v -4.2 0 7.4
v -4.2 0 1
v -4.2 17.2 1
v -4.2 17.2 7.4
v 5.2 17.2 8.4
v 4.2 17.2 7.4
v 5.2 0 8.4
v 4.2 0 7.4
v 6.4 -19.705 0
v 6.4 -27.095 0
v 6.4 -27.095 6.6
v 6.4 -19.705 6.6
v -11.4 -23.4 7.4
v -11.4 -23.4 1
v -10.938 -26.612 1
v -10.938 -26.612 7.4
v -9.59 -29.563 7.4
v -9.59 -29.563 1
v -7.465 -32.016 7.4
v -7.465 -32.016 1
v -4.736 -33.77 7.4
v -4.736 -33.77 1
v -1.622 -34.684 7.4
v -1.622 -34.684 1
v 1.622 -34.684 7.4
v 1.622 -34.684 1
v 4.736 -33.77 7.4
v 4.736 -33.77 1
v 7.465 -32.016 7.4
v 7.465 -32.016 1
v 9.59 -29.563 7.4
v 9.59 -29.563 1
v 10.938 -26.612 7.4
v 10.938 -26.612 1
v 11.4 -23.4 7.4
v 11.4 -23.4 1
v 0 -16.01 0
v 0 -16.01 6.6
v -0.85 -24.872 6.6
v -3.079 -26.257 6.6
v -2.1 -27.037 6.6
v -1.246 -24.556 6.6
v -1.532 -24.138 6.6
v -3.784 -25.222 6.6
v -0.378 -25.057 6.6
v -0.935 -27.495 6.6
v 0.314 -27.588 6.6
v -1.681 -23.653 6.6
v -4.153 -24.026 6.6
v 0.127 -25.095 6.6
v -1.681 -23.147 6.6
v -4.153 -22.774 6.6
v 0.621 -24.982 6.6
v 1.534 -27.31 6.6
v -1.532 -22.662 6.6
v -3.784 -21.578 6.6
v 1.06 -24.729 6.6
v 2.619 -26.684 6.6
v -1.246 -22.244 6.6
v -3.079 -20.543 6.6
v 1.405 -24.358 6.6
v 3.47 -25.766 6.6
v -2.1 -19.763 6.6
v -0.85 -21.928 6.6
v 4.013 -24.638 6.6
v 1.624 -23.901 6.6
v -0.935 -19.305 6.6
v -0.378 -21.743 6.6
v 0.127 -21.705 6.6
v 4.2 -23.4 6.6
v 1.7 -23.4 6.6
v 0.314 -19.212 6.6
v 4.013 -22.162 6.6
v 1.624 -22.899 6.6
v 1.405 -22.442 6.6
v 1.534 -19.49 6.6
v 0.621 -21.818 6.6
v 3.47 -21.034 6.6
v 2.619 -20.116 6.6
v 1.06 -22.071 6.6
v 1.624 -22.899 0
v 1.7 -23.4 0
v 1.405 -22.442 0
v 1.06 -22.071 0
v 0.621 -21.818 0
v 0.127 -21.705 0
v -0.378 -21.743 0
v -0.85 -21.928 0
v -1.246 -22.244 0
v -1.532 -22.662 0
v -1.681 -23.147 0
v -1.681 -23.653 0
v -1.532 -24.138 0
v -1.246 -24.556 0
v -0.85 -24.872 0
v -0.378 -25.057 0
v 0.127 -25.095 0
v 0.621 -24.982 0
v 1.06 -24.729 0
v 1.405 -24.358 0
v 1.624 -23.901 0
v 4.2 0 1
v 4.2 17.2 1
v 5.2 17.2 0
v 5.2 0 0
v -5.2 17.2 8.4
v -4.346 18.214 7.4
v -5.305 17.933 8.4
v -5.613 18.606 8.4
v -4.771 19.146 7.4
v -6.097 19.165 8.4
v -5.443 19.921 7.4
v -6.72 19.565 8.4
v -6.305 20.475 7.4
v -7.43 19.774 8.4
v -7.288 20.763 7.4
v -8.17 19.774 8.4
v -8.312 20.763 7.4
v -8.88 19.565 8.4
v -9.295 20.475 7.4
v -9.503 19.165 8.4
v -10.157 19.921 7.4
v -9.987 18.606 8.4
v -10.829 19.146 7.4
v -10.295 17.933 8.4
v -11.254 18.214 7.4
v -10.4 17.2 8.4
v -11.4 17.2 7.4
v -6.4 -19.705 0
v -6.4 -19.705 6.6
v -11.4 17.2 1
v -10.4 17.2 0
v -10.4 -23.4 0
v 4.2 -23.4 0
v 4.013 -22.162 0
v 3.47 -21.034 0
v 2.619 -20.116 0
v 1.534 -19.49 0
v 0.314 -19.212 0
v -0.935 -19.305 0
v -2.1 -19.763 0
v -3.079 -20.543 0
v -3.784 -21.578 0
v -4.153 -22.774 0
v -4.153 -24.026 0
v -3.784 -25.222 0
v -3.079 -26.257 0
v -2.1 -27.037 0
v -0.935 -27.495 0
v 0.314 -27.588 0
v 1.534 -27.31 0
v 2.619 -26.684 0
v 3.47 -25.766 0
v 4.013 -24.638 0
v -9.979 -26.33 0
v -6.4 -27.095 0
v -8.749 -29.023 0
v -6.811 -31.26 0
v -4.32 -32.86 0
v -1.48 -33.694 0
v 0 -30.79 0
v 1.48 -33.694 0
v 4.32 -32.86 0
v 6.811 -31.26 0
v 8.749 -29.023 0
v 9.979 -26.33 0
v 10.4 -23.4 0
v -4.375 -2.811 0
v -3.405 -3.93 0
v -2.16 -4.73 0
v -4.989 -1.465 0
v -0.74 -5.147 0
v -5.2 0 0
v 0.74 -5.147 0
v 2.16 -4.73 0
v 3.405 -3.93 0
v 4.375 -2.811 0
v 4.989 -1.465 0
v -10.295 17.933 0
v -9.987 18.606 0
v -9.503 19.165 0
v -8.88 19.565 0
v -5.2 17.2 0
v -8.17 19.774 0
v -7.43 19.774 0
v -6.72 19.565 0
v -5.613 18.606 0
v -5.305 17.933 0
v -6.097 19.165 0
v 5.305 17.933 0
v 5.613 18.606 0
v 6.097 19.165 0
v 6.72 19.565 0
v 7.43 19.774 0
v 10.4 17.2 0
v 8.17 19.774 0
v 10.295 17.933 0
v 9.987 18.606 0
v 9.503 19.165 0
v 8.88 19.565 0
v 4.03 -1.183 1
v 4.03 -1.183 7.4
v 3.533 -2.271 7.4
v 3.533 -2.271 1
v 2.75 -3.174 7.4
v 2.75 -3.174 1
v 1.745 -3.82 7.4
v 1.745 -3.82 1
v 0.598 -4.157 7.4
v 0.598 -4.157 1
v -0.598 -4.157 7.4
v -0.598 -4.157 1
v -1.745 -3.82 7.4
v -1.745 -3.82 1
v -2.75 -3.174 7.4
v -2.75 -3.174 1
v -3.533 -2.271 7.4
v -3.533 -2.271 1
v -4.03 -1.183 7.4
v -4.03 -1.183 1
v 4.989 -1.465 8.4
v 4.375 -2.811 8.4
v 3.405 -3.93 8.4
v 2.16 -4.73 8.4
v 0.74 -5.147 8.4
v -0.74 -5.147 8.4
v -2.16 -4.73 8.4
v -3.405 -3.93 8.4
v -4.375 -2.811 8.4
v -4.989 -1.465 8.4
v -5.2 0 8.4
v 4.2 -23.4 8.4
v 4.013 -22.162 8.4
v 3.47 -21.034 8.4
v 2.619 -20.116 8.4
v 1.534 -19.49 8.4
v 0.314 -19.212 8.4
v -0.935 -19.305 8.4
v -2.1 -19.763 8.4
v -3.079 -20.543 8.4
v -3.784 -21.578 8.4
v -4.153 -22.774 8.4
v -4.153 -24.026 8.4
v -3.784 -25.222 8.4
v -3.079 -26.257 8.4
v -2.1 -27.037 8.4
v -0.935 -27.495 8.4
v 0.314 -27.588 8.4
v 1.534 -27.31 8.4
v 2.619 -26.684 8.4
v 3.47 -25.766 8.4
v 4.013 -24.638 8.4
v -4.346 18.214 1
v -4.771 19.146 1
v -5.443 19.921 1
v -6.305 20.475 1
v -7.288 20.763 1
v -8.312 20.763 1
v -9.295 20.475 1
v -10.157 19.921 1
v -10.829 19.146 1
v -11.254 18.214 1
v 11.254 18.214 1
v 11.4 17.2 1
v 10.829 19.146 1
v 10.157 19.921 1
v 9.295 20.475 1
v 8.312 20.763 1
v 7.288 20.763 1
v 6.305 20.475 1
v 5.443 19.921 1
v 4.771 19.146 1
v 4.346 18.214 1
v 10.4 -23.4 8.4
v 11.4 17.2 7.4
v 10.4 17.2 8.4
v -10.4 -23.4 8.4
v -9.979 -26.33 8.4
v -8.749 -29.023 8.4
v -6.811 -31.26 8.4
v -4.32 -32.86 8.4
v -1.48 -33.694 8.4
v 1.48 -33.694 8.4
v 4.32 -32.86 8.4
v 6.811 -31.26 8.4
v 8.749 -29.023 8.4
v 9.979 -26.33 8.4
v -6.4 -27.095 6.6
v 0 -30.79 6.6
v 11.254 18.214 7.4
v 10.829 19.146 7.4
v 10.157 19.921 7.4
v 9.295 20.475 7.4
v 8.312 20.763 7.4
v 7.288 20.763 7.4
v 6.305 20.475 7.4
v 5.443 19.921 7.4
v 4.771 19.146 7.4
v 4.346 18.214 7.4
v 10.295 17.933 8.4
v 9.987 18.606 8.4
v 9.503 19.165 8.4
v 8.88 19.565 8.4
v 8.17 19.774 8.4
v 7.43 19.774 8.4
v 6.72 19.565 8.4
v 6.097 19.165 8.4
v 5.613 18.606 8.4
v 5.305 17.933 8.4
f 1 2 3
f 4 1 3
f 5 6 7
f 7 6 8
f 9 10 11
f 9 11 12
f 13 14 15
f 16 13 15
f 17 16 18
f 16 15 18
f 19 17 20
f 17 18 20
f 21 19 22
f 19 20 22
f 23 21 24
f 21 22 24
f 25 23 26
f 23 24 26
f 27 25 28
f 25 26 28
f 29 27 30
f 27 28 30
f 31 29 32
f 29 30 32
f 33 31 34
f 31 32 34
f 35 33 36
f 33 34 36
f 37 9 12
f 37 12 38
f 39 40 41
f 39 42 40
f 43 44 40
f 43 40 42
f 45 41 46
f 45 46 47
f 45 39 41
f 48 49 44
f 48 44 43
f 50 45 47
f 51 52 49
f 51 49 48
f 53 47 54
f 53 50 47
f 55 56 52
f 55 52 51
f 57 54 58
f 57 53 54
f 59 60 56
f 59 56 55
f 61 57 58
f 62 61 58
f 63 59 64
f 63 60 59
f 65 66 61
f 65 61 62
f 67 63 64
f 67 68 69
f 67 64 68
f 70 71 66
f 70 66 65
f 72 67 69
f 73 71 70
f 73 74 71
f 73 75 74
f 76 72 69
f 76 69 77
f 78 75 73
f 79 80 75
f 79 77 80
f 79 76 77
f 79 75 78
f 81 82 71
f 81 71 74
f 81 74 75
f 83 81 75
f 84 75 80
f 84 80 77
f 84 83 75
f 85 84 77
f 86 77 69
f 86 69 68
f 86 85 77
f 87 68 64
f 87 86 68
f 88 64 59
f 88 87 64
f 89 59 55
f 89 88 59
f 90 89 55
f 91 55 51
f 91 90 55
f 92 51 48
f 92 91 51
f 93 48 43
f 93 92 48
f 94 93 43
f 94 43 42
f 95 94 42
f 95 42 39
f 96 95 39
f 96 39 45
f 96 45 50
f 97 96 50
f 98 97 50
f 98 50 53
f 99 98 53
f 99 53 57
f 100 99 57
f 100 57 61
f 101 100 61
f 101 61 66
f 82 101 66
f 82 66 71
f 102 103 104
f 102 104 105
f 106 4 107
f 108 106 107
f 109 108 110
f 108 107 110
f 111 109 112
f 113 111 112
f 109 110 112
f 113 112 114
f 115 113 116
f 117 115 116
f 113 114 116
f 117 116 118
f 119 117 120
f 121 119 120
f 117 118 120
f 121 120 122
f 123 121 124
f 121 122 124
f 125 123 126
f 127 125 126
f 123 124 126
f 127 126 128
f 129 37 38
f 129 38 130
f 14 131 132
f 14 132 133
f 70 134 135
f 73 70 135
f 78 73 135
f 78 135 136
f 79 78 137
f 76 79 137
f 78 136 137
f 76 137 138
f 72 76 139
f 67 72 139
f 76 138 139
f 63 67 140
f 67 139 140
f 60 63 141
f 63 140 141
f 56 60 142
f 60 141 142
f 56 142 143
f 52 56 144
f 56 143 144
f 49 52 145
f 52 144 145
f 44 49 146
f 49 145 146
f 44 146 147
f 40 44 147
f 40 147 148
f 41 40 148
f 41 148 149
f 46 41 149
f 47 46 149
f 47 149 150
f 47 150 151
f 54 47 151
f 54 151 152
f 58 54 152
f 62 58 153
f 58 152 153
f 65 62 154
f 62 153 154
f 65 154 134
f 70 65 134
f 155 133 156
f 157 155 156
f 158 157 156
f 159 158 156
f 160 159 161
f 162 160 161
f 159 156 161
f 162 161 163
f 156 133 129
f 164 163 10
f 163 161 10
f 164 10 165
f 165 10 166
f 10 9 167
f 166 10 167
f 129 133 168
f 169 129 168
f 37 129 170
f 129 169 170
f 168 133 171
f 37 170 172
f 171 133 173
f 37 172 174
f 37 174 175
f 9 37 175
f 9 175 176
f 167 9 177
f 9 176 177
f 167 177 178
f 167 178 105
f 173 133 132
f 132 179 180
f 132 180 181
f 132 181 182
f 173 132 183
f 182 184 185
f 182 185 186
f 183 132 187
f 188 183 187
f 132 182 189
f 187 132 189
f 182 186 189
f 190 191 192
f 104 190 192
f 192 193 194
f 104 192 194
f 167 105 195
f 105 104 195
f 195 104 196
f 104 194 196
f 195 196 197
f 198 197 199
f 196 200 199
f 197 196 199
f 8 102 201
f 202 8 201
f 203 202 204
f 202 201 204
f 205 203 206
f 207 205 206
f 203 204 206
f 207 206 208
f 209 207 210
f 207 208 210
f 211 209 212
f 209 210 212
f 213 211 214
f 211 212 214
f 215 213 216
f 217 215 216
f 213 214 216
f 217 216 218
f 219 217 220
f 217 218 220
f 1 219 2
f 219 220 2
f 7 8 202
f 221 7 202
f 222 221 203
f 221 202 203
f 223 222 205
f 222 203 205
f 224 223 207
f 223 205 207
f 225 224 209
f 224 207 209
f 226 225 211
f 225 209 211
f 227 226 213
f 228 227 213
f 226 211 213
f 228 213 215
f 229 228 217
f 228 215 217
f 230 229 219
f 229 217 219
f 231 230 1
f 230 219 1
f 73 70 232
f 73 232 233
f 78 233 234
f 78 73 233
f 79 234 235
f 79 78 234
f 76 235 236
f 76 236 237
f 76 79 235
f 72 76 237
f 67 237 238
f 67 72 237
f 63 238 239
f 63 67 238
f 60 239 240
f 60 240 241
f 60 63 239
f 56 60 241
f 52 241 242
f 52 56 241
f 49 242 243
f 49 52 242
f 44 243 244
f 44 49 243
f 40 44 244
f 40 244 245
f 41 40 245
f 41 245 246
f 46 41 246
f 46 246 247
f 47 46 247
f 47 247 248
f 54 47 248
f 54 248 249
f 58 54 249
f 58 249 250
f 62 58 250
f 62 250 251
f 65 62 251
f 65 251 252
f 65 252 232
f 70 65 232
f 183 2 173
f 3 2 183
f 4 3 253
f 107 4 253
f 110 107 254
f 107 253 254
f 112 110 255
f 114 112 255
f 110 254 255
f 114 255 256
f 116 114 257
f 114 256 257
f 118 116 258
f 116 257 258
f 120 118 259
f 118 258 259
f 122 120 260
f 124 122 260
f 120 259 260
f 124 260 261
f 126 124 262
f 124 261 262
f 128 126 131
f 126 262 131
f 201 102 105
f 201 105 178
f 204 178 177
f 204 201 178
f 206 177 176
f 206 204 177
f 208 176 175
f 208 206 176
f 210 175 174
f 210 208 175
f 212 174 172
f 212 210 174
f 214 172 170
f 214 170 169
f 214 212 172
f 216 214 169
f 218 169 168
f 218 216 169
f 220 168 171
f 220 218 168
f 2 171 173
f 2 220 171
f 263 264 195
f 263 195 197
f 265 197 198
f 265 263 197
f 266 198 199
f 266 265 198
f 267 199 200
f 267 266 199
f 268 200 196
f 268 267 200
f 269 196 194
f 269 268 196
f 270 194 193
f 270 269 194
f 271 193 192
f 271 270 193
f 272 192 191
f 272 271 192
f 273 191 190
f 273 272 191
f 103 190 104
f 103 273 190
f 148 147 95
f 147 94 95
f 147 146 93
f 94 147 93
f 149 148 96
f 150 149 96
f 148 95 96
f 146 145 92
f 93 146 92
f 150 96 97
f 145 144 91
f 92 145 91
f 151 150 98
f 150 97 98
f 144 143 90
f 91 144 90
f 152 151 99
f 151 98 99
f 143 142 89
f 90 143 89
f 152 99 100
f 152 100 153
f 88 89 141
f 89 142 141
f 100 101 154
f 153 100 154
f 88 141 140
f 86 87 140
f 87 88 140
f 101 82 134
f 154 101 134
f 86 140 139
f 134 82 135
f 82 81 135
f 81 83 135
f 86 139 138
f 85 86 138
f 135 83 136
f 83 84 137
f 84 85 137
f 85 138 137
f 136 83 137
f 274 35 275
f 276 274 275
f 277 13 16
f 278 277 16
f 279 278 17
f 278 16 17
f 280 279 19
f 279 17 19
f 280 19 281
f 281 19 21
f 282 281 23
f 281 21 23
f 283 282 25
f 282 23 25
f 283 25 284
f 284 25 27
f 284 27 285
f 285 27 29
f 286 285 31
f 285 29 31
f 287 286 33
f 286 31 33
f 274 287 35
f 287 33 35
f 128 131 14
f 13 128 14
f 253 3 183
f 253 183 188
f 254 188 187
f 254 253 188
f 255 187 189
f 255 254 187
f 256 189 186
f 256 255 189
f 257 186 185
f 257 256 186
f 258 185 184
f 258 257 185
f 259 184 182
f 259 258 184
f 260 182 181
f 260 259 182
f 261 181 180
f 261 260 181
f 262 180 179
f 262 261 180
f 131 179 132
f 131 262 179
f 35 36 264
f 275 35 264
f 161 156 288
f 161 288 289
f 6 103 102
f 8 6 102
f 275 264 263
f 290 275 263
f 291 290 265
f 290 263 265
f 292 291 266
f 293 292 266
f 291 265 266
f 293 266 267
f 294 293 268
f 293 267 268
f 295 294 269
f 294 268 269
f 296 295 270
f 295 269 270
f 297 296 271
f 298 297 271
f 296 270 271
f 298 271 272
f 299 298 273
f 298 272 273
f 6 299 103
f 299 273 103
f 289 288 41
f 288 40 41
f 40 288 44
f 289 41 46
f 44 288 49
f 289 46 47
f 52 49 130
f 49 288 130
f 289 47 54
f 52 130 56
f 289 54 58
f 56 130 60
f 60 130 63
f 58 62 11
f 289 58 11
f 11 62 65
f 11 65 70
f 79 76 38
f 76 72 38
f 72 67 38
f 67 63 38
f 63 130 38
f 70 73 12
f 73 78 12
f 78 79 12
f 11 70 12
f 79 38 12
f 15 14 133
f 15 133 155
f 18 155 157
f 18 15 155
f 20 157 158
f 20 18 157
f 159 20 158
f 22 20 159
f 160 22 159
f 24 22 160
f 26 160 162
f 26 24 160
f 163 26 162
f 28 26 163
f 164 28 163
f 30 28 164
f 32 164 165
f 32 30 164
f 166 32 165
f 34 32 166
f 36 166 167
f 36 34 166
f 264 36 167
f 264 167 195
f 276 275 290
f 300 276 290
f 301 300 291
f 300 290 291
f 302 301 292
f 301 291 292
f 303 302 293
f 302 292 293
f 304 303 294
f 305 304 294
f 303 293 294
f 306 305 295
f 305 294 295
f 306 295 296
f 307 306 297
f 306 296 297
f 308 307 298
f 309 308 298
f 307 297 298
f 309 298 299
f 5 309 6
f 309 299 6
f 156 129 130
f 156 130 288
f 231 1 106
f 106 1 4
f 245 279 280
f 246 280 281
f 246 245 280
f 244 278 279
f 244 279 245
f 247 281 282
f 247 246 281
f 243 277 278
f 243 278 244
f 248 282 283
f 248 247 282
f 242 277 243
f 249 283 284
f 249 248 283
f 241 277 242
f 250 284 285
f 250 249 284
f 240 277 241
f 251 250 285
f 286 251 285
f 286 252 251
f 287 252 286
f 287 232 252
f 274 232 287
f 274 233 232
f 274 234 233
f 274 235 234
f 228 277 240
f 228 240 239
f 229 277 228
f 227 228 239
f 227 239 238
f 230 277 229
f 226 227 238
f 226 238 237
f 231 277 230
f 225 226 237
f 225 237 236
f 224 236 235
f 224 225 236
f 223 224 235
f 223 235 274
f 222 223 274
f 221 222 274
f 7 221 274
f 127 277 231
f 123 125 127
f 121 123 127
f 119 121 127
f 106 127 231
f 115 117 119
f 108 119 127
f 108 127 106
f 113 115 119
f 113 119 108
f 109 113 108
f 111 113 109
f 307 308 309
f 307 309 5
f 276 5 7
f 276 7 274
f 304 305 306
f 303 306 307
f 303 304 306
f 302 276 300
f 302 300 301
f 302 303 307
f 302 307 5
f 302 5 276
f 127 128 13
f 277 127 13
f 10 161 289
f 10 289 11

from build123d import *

# Parameters (mm, degrees)
F0_R     = 4.2
F1_DEPTH = 8.4
F2_DEPTH = 6.6
F3_DEPTH = 6.6
F4_T     = -2.5
F5_SIZE  = 1


with BuildPart() as f1:
    # F0 (on Top) → F1 (new body)
    with BuildSketch(Plane.XY):
        with BuildLine():
            Line((4.2, 17.2), (4.2, 0))
            ThreePointArc((4.2, 0), (0, -4.2), (-4.2, 0))
            Line((-4.2, 0), (-4.2, 17.2))
            ThreePointArc((-4.2, 17.2), (-7.8, 20.8), (-11.4, 17.2))
            Line((-11.4, 17.2), (-11.4, -23.4000007438))
            ThreePointArc((-11.4, -23.4000007438), (0, -34.8), (11.4, -23.4000007438))
            Line((11.4, -23.4000007438), (11.4, 17.2))
            ThreePointArc((11.4, 17.2), (7.8, 20.8), (4.2, 17.2))
        make_face()
        Polygon((0, -16.0099165544), (6.4, -19.7049582772), (6.4, -27.0950417228), (0, -30.7900834456), (-6.4, -27.0950417228), (-6.4, -19.7049582772), align=None, mode=Mode.SUBTRACT)
        Polygon((6.4, -27.0950417228), (6.4, -19.7049582772), (0, -16.0099165544), (-6.4, -19.7049582772), (-6.4, -27.0950417228), (0, -30.7900834456), align=None)
        with Locations((0, -23.4)):
            Circle(F0_R, mode=Mode.SUBTRACT)
    extrude(amount=F1_DEPTH)

    # F0 (on Top) → F2 (cut)
    with BuildSketch(Plane.XY):
        Polygon((6.4, -27.0950417228), (6.4, -19.7049582772), (0, -16.0099165544), (-6.4, -19.7049582772), (-6.4, -27.0950417228), (0, -30.7900834456), align=None)
        with Locations((0, -23.4)):
            Circle(F0_R, mode=Mode.SUBTRACT)
    extrude(amount=F2_DEPTH, mode=Mode.SUBTRACT)

    # F5
    f5_edges = [f1.edges().sort_by_distance(p)[0] for p in [
        (11.4, -3.1, 8.4),
        (-11.4, -3.1, 0),
    ]]
    chamfer(f5_edges, length=F5_SIZE)


with BuildPart() as f3:
    # F0 (on Top) → F3 (new body)
    with BuildSketch(Plane.XY):
        with Locations((0, -23.4)):
            Circle(F0_R)
    extrude(amount=F3_DEPTH)

    # F4
    f4_openings = [f3.faces().sort_by_distance(p)[0] for p in [
        (0, -23.4, 6.6),
        (0, -23.4, 0),
    ]]
    offset(amount=F4_T, openings=f4_openings)


solid = Compound([f1.part, f3.part])
